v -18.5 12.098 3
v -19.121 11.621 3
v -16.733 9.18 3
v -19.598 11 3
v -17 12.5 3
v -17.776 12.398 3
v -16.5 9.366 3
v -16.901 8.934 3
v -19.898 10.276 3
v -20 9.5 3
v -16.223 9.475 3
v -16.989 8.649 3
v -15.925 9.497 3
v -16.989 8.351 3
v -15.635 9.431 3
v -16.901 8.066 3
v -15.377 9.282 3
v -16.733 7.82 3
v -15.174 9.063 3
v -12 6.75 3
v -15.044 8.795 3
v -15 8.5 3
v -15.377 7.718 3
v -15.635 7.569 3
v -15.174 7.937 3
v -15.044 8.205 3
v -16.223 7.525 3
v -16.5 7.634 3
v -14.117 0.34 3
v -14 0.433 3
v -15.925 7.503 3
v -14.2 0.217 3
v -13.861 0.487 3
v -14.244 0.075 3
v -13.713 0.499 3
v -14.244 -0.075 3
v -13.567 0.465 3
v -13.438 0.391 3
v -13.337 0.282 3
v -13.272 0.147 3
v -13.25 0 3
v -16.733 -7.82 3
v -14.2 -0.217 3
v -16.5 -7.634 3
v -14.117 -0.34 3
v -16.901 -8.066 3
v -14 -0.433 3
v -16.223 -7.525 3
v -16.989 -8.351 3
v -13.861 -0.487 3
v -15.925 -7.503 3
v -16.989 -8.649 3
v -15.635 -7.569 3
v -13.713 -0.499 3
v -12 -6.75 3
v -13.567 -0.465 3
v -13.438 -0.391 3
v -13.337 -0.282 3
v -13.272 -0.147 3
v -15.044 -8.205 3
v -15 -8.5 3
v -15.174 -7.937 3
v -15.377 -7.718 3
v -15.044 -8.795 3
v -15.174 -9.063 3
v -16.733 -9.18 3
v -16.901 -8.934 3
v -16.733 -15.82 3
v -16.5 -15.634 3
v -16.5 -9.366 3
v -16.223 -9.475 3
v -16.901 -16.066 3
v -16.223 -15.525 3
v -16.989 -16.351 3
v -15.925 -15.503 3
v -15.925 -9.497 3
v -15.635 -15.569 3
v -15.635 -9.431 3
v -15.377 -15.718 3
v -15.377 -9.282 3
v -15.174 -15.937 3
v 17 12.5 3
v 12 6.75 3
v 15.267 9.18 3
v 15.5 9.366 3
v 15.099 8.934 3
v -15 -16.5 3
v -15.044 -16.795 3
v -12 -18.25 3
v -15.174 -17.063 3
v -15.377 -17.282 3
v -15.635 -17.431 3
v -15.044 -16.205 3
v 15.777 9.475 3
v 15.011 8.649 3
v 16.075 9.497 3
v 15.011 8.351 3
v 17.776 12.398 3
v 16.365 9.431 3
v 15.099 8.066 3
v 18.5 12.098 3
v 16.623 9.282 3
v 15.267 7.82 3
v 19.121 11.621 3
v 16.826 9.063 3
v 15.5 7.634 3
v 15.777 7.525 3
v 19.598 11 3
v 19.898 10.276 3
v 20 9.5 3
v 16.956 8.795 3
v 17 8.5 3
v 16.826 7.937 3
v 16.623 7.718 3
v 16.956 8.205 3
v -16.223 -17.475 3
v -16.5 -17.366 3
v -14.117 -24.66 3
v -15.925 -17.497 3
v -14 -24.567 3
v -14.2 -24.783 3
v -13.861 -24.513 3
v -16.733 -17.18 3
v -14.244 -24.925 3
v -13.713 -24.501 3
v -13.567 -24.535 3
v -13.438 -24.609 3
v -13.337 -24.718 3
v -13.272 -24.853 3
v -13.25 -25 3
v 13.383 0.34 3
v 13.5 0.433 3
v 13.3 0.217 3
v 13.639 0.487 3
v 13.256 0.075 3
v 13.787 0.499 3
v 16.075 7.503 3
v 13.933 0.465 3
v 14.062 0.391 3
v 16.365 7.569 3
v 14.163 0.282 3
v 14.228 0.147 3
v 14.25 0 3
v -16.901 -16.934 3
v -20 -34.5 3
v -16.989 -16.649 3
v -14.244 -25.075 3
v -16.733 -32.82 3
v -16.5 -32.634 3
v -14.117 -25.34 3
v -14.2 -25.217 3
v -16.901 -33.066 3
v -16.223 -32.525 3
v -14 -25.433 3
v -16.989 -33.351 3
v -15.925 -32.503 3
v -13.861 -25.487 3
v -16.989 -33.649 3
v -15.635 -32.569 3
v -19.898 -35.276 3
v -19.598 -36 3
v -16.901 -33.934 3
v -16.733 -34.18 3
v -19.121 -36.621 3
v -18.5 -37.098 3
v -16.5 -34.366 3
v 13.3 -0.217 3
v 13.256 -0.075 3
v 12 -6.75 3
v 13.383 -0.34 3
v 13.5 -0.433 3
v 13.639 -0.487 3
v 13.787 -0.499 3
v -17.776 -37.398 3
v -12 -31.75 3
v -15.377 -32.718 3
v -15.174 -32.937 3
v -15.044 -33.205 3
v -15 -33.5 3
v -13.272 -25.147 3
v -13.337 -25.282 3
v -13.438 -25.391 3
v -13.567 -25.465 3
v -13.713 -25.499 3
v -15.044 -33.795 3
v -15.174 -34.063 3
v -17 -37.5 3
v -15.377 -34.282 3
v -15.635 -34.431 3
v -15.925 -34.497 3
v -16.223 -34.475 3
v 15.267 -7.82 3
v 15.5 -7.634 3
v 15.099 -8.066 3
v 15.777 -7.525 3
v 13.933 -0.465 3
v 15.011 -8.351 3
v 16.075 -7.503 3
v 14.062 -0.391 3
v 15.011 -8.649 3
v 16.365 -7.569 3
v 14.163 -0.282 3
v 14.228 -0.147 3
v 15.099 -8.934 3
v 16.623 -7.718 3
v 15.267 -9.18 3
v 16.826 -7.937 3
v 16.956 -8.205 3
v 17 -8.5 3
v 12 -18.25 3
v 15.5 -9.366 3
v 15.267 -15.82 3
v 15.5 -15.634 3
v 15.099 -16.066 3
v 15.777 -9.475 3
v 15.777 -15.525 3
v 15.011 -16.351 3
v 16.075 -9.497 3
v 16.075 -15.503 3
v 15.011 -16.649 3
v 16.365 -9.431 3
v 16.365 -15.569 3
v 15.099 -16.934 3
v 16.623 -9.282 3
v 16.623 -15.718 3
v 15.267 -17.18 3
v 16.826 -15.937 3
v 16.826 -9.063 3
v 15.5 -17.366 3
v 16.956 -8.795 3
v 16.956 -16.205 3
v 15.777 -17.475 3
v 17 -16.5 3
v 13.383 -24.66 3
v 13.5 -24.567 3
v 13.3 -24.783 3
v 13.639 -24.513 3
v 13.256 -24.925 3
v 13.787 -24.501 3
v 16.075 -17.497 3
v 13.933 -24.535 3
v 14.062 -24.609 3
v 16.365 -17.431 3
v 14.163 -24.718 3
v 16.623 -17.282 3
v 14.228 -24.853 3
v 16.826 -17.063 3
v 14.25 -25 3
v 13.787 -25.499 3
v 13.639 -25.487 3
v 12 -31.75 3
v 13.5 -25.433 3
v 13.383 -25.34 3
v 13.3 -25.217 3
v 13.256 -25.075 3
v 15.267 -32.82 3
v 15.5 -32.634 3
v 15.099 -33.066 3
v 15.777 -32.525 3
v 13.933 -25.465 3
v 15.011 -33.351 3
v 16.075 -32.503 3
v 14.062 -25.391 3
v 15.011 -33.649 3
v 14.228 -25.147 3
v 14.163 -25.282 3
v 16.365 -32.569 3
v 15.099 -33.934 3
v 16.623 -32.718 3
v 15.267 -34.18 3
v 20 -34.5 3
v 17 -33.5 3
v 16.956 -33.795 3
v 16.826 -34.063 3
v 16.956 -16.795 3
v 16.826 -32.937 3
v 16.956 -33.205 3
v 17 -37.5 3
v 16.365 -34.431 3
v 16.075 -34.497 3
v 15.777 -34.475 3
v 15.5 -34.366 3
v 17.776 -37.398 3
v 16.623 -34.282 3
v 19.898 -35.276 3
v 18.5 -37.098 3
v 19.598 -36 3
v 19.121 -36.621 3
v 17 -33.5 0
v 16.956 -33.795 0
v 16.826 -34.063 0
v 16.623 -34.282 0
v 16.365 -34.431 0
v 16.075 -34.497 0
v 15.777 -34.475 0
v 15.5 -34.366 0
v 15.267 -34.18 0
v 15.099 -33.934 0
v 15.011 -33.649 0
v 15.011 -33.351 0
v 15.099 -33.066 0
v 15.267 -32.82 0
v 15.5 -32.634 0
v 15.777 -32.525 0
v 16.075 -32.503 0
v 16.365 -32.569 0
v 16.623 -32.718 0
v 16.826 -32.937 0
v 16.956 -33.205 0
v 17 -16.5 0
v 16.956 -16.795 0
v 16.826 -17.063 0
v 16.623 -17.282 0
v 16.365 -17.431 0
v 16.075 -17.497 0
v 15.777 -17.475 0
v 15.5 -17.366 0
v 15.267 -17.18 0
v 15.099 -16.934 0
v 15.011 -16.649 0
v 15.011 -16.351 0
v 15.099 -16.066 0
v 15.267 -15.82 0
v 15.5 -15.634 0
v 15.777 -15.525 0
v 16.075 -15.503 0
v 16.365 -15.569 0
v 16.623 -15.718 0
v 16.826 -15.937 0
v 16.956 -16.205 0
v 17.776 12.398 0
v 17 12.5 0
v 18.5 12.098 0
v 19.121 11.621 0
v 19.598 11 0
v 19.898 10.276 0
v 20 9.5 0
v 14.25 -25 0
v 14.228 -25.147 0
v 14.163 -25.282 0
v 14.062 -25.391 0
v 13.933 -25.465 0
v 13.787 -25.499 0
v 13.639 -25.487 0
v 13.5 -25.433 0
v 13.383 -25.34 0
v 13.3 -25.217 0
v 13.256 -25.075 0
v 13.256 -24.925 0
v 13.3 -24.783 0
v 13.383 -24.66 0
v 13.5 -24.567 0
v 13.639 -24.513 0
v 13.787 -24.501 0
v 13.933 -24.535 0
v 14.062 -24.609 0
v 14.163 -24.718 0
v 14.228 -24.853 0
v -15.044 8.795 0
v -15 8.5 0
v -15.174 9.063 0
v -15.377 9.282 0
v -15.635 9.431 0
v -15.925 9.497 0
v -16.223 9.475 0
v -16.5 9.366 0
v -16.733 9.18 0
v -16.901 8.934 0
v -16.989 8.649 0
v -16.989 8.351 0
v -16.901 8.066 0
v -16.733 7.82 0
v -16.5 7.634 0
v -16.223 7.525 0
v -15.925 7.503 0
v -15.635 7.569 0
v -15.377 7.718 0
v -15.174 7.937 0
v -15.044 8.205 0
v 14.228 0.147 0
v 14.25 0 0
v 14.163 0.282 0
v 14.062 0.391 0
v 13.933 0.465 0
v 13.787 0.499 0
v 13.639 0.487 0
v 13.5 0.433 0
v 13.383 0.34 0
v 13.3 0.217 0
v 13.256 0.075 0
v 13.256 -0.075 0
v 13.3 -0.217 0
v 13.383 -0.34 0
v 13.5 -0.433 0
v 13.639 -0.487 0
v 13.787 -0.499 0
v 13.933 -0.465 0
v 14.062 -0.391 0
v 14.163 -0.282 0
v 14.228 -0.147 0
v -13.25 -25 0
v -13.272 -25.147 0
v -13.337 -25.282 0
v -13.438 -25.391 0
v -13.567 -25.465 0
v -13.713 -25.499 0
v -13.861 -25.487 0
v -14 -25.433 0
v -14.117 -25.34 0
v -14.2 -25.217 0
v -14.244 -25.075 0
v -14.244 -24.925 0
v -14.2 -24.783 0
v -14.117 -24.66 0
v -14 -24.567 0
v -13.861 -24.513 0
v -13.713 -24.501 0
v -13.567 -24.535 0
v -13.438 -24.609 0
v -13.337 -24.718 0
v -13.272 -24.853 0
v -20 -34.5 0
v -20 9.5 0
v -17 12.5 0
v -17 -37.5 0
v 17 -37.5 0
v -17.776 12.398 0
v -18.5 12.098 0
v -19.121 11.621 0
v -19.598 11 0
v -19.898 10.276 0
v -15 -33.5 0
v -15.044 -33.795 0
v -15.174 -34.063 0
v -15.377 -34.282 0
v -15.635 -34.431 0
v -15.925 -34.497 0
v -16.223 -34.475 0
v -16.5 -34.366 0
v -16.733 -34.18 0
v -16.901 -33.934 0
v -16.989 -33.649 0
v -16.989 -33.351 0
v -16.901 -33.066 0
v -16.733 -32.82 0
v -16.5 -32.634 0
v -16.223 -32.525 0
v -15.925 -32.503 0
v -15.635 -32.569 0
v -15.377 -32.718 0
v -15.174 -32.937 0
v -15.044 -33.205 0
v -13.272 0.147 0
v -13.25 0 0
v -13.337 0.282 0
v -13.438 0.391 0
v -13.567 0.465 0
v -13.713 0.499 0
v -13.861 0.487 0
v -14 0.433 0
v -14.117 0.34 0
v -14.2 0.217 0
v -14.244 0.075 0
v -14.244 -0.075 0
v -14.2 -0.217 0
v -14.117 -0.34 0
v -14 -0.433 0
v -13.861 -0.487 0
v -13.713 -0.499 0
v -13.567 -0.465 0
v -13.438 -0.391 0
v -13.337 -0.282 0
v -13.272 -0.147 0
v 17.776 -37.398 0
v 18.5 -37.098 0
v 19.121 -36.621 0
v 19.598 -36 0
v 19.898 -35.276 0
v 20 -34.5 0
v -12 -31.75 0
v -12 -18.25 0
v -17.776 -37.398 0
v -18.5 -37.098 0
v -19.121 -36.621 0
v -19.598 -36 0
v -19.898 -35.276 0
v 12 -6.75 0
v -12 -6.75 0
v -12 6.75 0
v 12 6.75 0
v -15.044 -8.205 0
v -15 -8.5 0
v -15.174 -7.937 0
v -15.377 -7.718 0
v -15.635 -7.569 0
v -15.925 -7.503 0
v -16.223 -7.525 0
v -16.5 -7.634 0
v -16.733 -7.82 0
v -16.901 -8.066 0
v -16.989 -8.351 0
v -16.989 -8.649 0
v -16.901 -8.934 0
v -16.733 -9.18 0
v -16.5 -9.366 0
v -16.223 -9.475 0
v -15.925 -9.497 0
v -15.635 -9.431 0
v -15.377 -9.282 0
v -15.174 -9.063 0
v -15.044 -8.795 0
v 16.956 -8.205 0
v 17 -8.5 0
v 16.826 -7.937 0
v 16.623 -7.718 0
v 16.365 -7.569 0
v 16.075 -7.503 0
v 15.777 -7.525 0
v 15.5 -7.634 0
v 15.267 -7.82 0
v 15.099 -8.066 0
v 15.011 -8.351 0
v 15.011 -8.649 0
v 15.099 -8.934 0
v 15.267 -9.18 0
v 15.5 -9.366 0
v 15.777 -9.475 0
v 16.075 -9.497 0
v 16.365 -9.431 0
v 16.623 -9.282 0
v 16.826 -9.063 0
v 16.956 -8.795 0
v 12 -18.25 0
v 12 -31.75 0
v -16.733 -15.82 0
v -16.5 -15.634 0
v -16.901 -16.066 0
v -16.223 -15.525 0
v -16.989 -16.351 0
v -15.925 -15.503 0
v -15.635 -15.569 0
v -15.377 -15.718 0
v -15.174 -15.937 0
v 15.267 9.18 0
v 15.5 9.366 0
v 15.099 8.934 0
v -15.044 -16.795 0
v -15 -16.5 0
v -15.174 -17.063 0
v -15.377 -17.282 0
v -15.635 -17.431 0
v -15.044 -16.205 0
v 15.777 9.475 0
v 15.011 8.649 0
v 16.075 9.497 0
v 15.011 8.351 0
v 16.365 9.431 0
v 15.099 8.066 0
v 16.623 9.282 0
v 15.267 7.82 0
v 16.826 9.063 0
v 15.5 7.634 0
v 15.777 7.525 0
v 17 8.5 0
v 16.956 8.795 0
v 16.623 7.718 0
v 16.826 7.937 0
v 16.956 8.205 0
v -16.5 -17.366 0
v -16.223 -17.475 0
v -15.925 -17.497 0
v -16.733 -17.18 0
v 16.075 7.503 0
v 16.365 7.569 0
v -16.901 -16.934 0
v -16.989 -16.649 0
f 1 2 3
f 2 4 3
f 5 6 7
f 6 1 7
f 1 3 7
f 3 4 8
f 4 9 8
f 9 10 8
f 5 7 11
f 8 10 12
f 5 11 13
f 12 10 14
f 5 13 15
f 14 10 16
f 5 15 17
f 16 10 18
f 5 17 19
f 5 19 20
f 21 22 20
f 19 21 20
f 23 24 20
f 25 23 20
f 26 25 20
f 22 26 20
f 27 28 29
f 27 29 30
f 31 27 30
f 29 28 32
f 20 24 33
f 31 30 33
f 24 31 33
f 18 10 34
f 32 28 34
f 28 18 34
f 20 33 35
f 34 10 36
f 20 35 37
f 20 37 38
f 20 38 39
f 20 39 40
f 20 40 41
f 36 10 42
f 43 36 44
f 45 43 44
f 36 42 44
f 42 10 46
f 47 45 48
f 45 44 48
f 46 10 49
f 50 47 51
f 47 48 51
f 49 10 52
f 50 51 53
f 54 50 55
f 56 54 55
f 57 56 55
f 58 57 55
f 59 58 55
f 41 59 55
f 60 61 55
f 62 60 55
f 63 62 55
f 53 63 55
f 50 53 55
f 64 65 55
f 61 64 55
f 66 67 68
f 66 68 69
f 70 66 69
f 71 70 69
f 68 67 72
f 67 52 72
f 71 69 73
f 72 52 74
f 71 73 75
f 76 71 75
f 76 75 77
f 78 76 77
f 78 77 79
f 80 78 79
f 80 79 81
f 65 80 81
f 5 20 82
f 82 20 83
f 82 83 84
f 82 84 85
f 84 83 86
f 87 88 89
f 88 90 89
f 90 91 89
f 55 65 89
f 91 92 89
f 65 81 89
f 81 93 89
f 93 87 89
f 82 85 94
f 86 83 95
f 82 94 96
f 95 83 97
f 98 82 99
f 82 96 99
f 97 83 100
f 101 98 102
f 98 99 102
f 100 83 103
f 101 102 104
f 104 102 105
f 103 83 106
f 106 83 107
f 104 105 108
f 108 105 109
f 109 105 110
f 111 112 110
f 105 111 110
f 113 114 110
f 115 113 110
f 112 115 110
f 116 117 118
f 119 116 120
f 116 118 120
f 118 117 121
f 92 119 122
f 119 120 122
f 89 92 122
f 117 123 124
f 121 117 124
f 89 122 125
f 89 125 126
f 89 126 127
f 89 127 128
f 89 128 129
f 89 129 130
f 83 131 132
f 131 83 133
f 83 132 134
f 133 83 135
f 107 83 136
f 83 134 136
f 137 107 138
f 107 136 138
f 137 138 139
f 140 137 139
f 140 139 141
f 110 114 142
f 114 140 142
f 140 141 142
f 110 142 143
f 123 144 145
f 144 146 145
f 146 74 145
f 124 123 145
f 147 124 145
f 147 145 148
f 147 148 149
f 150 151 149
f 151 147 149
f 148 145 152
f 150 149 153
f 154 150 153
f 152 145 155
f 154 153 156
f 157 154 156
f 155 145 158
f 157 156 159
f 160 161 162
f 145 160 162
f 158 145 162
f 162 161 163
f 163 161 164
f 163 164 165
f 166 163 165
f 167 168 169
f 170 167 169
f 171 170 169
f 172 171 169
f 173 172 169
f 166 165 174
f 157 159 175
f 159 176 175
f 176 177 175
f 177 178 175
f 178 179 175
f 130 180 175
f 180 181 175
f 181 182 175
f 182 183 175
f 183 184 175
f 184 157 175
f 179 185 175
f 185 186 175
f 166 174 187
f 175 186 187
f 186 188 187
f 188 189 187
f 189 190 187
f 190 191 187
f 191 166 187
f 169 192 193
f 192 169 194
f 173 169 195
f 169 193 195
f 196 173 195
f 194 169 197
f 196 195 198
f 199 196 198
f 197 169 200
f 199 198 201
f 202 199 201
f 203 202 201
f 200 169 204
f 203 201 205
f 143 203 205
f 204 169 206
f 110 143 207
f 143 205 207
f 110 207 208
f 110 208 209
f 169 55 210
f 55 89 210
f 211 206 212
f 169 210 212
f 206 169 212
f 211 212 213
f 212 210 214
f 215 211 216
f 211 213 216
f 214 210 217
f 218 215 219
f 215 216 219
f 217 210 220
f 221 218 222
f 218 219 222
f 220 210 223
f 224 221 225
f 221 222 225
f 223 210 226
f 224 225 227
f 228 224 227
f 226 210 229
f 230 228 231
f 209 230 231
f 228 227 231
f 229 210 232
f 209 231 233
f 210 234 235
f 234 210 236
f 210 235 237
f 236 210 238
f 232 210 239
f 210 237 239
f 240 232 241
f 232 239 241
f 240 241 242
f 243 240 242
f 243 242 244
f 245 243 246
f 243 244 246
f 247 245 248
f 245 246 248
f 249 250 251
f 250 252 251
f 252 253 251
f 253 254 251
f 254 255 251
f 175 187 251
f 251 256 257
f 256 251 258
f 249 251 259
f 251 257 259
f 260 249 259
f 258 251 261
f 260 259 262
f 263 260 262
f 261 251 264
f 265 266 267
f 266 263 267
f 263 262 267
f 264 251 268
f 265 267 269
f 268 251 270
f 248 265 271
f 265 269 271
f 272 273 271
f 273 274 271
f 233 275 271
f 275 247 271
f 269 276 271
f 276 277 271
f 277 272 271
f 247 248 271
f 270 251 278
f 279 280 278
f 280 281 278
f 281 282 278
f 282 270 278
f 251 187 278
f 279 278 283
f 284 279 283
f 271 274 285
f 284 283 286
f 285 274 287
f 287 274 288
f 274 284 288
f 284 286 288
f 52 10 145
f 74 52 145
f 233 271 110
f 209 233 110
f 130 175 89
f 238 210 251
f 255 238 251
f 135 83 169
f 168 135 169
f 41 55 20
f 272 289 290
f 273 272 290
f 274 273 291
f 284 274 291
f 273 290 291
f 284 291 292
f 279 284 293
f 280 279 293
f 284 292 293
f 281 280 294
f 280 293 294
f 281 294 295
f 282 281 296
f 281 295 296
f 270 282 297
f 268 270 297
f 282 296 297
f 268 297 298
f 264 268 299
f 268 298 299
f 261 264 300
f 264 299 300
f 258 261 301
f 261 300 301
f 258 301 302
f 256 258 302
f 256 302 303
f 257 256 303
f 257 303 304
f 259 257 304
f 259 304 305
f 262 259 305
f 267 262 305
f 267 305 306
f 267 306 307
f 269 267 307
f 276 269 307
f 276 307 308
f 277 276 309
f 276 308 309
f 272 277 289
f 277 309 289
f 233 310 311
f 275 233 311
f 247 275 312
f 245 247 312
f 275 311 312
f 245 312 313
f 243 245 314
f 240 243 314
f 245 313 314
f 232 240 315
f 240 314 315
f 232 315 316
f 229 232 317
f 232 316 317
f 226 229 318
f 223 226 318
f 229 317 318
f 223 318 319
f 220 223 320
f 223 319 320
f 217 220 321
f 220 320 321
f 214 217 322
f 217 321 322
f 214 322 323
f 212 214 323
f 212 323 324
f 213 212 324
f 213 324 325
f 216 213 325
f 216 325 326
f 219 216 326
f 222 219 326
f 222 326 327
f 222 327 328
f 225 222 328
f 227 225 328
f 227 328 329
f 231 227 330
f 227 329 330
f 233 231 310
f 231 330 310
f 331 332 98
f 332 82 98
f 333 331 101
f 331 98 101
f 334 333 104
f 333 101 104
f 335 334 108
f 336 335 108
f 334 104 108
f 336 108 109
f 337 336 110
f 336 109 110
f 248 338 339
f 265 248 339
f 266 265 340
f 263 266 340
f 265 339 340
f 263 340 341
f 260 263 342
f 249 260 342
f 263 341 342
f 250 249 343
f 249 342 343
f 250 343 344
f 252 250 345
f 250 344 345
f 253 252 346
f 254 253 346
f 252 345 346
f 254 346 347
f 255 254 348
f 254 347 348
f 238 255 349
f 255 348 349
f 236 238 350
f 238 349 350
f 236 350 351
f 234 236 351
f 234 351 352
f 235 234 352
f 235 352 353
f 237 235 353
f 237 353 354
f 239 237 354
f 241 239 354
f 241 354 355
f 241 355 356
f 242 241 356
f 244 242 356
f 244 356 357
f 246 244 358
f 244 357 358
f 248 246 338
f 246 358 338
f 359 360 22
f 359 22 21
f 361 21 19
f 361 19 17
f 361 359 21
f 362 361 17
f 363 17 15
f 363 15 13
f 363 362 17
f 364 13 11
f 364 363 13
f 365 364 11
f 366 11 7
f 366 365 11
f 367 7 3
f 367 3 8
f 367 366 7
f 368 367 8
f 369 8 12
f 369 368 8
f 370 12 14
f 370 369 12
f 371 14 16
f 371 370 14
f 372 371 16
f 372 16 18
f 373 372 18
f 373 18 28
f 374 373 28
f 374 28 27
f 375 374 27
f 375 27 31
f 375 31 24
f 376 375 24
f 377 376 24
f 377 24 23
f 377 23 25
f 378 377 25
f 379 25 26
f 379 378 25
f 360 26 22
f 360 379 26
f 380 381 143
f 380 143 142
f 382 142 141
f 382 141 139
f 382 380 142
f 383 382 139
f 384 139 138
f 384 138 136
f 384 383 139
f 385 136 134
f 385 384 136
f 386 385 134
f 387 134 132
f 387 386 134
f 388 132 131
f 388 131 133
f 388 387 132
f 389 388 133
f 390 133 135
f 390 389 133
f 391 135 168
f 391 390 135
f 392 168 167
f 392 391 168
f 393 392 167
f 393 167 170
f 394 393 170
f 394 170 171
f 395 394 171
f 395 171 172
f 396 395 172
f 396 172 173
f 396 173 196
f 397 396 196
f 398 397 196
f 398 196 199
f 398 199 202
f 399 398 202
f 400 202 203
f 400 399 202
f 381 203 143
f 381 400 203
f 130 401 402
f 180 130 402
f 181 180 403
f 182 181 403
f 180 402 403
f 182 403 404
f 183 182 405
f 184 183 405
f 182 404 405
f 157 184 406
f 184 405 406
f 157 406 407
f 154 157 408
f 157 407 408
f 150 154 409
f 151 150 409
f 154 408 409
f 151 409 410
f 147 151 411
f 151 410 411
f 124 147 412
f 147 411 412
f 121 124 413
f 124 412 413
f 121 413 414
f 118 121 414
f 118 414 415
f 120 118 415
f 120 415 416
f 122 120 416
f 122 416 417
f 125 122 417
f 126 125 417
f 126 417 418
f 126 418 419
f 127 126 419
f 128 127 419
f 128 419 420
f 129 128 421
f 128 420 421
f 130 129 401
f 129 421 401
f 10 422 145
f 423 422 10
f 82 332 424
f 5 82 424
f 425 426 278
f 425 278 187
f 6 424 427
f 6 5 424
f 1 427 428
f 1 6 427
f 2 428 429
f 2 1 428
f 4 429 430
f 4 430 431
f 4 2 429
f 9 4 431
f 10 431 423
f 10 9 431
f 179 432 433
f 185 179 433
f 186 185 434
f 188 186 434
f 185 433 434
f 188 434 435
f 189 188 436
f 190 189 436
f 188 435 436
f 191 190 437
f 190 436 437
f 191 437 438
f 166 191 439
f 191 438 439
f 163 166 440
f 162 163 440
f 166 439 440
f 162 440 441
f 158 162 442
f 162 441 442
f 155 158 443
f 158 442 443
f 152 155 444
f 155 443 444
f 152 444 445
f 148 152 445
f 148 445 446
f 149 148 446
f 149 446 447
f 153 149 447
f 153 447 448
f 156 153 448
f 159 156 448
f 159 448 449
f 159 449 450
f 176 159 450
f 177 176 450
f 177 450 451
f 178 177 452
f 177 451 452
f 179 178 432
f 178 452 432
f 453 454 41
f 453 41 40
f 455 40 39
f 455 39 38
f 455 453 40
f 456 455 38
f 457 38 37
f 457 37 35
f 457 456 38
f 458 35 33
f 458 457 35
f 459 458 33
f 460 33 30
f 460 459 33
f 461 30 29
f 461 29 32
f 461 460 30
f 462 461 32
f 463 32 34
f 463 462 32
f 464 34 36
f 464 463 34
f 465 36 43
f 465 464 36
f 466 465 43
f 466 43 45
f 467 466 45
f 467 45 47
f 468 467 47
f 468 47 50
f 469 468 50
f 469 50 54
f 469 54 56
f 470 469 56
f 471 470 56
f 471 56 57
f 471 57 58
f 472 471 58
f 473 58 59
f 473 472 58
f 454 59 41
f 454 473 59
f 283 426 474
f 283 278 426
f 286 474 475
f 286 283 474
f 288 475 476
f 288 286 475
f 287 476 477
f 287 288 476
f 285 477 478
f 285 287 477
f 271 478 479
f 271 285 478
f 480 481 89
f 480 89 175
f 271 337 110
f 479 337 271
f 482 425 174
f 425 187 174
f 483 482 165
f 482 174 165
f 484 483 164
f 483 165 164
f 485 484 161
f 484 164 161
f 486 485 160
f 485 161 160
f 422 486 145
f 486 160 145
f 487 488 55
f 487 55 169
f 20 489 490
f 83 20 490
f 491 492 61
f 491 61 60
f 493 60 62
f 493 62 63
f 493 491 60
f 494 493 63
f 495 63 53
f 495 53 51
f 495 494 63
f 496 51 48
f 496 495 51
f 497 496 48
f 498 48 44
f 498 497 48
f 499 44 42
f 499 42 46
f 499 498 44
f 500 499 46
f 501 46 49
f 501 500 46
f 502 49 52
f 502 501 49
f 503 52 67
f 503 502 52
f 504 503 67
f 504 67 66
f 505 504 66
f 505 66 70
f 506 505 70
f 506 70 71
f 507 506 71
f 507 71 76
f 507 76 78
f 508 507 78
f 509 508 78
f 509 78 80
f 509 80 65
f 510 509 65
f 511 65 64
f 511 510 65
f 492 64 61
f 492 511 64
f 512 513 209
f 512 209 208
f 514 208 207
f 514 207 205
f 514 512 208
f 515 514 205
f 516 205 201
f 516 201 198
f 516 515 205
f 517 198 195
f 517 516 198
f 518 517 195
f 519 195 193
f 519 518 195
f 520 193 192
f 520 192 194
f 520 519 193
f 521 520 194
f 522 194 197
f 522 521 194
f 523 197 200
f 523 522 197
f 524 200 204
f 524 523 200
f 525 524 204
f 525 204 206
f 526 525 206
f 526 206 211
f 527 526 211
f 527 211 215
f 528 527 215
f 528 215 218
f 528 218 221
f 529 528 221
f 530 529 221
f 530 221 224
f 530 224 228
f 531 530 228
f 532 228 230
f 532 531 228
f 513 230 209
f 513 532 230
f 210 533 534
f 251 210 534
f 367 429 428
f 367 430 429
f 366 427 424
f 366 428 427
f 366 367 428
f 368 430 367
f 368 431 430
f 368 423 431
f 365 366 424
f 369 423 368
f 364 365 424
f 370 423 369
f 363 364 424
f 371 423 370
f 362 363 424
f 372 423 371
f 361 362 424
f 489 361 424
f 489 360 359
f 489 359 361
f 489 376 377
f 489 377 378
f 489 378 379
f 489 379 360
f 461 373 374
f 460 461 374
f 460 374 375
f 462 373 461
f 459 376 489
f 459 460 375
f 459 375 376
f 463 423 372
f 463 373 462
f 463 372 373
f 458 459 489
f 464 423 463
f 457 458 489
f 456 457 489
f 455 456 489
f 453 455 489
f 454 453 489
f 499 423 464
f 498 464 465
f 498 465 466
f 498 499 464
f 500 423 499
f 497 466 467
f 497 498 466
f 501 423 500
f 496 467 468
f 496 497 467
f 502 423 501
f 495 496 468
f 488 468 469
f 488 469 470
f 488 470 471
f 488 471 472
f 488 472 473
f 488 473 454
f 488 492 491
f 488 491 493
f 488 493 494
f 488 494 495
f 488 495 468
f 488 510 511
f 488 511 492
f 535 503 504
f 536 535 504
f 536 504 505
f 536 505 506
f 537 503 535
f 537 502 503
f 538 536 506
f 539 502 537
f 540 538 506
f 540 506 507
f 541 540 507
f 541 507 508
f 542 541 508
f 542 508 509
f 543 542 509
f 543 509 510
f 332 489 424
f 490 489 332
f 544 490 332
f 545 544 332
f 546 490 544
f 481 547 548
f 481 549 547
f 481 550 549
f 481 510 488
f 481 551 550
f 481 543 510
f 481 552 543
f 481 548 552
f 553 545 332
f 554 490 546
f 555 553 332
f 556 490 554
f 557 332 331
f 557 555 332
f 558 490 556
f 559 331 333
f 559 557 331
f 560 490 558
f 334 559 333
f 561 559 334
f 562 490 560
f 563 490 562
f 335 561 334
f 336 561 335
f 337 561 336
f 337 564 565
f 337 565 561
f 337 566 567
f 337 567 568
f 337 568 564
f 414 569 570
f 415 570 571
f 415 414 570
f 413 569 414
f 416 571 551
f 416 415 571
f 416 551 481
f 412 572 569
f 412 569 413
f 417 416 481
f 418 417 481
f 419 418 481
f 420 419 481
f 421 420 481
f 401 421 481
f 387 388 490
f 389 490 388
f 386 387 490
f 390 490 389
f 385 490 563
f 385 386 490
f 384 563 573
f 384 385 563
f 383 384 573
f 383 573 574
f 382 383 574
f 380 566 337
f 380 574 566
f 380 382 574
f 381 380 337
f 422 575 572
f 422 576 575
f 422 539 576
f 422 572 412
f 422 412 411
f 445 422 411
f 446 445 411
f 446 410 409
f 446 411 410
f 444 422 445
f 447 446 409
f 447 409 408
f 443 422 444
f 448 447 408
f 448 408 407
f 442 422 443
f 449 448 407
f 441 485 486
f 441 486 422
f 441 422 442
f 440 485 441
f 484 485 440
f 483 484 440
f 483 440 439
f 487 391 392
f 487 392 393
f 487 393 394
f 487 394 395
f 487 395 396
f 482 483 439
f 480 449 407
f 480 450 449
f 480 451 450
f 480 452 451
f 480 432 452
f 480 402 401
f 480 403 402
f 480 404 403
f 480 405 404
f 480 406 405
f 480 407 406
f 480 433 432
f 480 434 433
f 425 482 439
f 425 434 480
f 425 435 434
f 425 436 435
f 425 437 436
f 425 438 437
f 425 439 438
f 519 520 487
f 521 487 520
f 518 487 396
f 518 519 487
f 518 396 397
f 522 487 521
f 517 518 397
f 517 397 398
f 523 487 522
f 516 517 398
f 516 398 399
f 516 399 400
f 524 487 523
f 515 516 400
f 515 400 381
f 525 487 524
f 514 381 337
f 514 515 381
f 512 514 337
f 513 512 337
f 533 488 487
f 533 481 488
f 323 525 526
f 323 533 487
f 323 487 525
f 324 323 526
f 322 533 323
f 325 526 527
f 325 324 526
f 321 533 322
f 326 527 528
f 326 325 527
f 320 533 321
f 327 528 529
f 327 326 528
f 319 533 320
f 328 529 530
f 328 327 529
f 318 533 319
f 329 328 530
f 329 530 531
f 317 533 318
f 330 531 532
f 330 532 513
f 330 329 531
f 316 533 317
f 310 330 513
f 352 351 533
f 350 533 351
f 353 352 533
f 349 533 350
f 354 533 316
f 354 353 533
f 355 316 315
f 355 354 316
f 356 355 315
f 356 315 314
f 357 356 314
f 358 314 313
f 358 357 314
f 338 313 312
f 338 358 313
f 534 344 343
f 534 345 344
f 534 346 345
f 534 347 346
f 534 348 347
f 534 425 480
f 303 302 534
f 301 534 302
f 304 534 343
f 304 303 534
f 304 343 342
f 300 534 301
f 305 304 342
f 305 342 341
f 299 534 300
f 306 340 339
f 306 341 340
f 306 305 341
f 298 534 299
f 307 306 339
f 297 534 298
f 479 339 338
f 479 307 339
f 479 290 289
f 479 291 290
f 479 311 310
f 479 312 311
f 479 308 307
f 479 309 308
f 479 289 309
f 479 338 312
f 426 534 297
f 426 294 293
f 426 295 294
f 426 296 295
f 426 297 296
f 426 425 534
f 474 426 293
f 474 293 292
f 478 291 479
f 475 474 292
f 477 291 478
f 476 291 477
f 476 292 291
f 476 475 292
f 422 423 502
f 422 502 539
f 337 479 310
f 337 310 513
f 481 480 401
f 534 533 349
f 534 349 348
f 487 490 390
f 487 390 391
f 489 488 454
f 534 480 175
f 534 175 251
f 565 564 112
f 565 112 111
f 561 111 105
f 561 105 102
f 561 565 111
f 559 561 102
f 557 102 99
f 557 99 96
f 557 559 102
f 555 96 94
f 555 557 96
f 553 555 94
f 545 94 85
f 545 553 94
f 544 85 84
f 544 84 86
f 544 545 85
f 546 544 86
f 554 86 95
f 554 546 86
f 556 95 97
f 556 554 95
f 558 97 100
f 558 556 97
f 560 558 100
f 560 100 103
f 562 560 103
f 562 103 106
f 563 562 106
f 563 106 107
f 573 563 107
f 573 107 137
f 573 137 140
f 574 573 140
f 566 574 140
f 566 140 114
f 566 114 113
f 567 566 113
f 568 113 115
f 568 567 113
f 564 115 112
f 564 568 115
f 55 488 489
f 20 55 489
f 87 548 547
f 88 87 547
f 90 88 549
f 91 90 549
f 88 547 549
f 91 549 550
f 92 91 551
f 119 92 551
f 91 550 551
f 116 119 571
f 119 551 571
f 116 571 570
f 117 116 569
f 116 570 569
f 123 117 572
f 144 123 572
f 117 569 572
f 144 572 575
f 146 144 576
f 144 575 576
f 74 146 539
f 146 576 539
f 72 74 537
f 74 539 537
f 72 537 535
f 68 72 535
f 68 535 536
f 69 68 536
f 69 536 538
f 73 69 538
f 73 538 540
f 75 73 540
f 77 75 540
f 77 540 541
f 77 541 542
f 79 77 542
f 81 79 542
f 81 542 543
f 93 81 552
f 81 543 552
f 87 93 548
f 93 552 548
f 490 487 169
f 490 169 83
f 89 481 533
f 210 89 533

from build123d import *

# Parameters (mm, degrees)
F0_R     = 1
F0_R_2   = 0.5
F0_W     = 24
F0_H     = 13.5
F1_DEPTH = 3
F3_R     = 3


with BuildPart() as f1:
    # F0 (on Top) → F1 (new body)
    with BuildSketch(Plane.XY):
        Polygon((20, -8.5), (20, 12.5), (16, 12.5), (-20, 12.5), (-20, -8.5), (-20, -12.5), (-16, -12.5), (16, -12.5), (20, -12.5), align=None)
        with Locations((-16, -8.5)):
            Circle(F0_R, mode=Mode.SUBTRACT)
        with Locations((16, -8.5)):
            Circle(F0_R, mode=Mode.SUBTRACT)
        with Locations((-13.75, 0)):
            Circle(F0_R_2, mode=Mode.SUBTRACT)
        with Locations((-16, 8.5)):
            Circle(F0_R, mode=Mode.SUBTRACT)
        Rectangle(F0_W, F0_H, mode=Mode.SUBTRACT)
        with Locations((13.75, 0)):
            Circle(F0_R_2, mode=Mode.SUBTRACT)
        with Locations((16, 8.5)):
            Circle(F0_R, mode=Mode.SUBTRACT)
    extrude(amount=F1_DEPTH)

    # F2: F1 across face


with BuildPart() as f1_1:
    add(f1.part)
    add(f1.part.mirror(Plane(origin=(0, -12.5, 1.5), x_dir=(1, 0, 0), z_dir=(0, -1, 0))))

    # F3
    f3_edges = [f1_1.edges().sort_by_distance(p)[0] for p in [
        (-20, -37.5, 1.5),
        (20, -37.5, 1.5),
        (20, 12.5, 1.5),
        (-20, 12.5, 1.5),
    ]]
    fillet(f3_edges, radius=F3_R)


solid = f1_1.part
